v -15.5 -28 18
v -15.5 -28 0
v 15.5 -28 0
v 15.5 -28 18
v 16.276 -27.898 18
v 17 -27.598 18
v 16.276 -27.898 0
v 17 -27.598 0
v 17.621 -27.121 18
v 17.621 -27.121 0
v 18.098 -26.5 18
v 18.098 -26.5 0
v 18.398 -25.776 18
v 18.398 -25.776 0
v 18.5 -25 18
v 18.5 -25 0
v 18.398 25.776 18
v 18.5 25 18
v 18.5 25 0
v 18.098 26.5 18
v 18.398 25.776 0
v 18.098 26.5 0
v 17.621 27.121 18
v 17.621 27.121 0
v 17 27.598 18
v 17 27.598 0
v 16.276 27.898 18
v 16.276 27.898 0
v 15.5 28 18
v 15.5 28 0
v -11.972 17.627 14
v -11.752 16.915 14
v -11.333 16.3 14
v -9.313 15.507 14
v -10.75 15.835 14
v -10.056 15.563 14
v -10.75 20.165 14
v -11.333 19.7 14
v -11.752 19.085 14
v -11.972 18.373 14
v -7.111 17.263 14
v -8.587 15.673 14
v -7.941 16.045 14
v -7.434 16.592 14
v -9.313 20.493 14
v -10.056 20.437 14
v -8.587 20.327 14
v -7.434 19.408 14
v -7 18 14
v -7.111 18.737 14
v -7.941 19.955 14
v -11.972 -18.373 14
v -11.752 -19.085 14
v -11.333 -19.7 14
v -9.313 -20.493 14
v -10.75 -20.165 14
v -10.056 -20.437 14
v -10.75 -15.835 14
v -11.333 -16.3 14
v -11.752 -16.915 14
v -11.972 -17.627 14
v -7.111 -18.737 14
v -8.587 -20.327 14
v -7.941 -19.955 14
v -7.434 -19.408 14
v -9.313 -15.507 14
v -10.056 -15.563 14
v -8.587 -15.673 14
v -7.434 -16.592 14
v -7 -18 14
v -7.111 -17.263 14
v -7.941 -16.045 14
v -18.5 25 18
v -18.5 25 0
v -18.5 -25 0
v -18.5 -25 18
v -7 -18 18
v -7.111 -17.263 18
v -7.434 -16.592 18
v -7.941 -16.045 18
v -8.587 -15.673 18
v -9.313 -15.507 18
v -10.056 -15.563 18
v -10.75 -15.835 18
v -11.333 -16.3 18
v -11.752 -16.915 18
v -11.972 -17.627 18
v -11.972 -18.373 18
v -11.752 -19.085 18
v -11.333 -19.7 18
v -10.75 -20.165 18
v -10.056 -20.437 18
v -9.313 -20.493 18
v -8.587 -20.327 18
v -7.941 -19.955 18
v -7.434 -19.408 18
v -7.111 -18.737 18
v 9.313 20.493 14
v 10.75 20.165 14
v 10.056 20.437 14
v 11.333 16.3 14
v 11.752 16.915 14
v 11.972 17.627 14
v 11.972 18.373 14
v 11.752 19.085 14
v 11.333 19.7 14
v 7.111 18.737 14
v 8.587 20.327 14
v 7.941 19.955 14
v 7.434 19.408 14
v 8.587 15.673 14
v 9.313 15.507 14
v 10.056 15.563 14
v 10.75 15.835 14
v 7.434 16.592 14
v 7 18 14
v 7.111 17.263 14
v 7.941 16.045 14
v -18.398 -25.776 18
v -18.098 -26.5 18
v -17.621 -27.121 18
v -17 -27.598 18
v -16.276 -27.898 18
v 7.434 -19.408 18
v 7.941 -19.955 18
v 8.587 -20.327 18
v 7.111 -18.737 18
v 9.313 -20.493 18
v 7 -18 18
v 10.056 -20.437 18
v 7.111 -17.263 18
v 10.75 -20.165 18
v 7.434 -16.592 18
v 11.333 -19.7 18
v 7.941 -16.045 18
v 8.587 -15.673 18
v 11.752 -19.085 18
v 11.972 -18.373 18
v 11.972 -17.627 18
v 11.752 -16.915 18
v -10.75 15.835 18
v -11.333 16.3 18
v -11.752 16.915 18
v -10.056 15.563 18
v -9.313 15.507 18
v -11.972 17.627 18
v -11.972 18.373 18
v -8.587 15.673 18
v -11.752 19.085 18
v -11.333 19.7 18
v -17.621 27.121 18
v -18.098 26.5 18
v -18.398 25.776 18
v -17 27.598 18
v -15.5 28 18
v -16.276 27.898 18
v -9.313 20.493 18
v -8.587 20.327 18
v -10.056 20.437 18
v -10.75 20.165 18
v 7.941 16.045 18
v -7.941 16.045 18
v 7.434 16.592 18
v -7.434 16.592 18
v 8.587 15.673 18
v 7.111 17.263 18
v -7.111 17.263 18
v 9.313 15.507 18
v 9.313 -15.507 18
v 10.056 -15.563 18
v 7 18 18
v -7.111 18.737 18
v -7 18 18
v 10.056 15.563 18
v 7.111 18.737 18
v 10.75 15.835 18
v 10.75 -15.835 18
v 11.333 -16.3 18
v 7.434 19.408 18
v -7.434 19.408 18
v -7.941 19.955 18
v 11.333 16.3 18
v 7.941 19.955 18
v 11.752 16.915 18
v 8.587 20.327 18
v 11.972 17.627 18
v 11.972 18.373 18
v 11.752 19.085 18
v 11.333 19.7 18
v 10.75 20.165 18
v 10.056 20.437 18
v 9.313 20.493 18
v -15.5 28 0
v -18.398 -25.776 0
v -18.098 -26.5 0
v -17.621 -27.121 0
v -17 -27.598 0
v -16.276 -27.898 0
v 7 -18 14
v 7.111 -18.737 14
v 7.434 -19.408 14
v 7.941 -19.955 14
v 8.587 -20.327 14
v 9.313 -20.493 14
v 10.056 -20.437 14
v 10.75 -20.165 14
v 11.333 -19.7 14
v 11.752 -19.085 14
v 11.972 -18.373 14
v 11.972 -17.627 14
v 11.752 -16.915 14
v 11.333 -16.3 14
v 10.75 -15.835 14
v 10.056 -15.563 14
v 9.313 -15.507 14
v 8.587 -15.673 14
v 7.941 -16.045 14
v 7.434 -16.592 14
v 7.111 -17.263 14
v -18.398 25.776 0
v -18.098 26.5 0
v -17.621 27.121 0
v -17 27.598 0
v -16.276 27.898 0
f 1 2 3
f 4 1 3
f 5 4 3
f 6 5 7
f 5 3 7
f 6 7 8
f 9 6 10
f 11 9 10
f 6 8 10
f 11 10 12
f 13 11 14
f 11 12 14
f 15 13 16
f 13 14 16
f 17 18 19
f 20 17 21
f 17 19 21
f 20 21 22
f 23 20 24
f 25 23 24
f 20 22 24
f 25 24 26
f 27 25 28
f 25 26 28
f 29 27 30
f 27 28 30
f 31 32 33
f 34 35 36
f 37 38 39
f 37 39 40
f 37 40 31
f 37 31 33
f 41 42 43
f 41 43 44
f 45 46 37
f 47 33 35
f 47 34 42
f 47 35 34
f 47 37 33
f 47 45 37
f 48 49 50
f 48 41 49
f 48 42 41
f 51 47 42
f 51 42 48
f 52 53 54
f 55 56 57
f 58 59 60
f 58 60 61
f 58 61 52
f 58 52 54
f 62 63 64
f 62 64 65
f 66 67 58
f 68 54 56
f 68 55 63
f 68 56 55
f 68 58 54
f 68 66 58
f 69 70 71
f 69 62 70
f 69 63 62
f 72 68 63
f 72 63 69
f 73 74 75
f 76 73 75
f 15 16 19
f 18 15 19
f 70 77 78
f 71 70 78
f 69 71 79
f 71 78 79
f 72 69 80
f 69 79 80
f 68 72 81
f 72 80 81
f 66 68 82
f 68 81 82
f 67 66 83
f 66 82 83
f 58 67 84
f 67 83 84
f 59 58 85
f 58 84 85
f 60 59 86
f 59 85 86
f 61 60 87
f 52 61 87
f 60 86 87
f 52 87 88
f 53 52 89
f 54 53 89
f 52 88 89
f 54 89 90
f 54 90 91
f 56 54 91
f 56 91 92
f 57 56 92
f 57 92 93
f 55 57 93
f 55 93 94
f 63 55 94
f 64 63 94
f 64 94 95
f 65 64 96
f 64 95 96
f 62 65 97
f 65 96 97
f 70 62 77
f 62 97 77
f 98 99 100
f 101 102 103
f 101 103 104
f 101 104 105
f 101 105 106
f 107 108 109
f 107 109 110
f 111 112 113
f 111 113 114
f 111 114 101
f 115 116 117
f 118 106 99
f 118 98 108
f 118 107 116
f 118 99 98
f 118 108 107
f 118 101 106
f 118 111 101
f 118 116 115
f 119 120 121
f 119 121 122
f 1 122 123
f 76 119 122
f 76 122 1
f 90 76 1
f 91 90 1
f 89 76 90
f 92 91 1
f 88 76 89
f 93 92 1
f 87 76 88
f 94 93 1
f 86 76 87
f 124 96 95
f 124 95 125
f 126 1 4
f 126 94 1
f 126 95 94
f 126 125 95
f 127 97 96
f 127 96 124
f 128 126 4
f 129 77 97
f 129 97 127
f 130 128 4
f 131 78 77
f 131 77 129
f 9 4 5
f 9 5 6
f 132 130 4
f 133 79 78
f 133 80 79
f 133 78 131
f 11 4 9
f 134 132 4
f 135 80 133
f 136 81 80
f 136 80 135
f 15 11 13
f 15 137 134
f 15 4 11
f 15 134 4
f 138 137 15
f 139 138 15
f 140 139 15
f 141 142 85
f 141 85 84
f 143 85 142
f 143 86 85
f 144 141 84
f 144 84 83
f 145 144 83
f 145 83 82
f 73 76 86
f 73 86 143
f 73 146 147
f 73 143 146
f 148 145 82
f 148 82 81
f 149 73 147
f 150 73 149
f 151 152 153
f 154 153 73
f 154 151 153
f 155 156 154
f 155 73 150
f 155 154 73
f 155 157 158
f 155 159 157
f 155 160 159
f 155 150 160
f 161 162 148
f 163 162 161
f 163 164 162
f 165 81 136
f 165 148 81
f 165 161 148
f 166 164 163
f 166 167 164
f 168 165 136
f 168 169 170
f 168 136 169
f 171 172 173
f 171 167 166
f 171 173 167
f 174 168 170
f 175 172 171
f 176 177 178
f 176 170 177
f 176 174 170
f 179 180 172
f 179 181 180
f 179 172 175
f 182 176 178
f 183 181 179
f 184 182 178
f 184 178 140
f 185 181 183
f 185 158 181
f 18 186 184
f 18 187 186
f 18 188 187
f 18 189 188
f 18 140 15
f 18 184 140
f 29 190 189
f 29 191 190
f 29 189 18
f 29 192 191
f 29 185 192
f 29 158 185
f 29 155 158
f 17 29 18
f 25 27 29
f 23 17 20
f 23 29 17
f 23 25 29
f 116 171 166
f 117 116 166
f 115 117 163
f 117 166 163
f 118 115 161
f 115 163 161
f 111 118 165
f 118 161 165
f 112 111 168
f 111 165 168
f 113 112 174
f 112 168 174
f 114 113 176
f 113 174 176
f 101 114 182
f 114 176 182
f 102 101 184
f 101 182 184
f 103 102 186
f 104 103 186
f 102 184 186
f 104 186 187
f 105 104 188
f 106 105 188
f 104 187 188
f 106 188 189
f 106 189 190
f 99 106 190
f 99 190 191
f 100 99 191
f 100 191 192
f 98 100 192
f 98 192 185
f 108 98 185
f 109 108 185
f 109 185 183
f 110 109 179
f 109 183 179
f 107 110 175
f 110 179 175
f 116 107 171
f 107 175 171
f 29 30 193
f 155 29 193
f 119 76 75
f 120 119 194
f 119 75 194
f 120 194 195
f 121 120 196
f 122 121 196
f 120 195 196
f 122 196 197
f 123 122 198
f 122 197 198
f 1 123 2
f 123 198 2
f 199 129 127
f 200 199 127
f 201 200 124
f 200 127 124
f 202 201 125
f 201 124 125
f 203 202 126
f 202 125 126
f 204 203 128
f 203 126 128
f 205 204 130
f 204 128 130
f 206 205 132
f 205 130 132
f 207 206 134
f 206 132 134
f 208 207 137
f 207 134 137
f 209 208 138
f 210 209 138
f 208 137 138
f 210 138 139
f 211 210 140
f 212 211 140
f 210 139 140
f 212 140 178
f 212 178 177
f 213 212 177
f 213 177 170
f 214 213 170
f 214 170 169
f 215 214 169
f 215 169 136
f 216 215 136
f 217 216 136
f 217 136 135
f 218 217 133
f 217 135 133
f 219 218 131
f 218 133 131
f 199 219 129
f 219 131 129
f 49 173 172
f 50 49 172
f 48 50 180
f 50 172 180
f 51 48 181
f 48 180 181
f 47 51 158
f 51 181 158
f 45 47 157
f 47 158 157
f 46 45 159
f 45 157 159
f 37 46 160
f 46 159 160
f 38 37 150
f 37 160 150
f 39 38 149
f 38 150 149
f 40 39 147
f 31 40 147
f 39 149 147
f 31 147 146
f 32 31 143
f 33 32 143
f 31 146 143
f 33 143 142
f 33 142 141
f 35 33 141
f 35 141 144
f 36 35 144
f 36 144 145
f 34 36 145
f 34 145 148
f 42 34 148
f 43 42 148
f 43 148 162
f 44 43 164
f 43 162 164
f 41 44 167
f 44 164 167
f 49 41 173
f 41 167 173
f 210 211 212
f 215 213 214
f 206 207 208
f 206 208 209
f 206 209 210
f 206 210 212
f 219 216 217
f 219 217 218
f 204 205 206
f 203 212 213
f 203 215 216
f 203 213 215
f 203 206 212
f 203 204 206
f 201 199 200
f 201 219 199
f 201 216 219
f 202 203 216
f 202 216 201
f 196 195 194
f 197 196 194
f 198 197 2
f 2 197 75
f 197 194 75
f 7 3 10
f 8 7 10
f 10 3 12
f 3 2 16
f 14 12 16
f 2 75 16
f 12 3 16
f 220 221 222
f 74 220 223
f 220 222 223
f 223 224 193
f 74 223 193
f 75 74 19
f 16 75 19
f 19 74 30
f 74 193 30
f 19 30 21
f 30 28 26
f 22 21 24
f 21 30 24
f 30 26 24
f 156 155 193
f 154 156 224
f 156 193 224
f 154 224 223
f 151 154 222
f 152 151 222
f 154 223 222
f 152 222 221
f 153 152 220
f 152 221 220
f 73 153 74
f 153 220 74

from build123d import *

# Parameters (mm, degrees)
BOSS_EXTRUDE1_DEPTH = 18
SKETCH2_R           = 2.5
CUT_EXTRUDE1_DEPTH  = 4


with BuildPart() as part:
    # Sketch1 → Boss-Extrude1 (new body)
    with BuildSketch(Plane.XY):
        with BuildLine():
            Line((-15.5, -28), (15.5, -28))
            ThreePointArc((15.5, -28), (17.621320344, -27.121320344), (18.5, -25))
            Line((18.5, -25), (18.5, 25))
            ThreePointArc((18.5, 25), (17.621320344, 27.121320344), (15.5, 28))
            Line((15.5, 28), (-15.5, 28))
            ThreePointArc((-15.5, 28), (-17.621320344, 27.121320344), (-18.5, 25))
            Line((-18.5, 25), (-18.5, -25))
            ThreePointArc((-18.5, -25), (-17.621320344, -27.121320344), (-15.5, -28))
        make_face()
    extrude(amount=BOSS_EXTRUDE1_DEPTH)

    # Sketch2 → Cut-Extrude1 (cut)
    with BuildSketch(Plane.XY.offset(18)):
        with Locations((-9.5, 18)):
            Circle(SKETCH2_R)
        with Locations((-9.5, -18)):
            Circle(SKETCH2_R)
        with Locations(Location((9.5, -18, 0), (0, 0, 180))):
            Circle(SKETCH2_R)
        with Locations(Location((9.5, 18, 0), (0, 0, 180))):
            Circle(SKETCH2_R)
    extrude(amount=-CUT_EXTRUDE1_DEPTH, mode=Mode.SUBTRACT)


solid = part.part
